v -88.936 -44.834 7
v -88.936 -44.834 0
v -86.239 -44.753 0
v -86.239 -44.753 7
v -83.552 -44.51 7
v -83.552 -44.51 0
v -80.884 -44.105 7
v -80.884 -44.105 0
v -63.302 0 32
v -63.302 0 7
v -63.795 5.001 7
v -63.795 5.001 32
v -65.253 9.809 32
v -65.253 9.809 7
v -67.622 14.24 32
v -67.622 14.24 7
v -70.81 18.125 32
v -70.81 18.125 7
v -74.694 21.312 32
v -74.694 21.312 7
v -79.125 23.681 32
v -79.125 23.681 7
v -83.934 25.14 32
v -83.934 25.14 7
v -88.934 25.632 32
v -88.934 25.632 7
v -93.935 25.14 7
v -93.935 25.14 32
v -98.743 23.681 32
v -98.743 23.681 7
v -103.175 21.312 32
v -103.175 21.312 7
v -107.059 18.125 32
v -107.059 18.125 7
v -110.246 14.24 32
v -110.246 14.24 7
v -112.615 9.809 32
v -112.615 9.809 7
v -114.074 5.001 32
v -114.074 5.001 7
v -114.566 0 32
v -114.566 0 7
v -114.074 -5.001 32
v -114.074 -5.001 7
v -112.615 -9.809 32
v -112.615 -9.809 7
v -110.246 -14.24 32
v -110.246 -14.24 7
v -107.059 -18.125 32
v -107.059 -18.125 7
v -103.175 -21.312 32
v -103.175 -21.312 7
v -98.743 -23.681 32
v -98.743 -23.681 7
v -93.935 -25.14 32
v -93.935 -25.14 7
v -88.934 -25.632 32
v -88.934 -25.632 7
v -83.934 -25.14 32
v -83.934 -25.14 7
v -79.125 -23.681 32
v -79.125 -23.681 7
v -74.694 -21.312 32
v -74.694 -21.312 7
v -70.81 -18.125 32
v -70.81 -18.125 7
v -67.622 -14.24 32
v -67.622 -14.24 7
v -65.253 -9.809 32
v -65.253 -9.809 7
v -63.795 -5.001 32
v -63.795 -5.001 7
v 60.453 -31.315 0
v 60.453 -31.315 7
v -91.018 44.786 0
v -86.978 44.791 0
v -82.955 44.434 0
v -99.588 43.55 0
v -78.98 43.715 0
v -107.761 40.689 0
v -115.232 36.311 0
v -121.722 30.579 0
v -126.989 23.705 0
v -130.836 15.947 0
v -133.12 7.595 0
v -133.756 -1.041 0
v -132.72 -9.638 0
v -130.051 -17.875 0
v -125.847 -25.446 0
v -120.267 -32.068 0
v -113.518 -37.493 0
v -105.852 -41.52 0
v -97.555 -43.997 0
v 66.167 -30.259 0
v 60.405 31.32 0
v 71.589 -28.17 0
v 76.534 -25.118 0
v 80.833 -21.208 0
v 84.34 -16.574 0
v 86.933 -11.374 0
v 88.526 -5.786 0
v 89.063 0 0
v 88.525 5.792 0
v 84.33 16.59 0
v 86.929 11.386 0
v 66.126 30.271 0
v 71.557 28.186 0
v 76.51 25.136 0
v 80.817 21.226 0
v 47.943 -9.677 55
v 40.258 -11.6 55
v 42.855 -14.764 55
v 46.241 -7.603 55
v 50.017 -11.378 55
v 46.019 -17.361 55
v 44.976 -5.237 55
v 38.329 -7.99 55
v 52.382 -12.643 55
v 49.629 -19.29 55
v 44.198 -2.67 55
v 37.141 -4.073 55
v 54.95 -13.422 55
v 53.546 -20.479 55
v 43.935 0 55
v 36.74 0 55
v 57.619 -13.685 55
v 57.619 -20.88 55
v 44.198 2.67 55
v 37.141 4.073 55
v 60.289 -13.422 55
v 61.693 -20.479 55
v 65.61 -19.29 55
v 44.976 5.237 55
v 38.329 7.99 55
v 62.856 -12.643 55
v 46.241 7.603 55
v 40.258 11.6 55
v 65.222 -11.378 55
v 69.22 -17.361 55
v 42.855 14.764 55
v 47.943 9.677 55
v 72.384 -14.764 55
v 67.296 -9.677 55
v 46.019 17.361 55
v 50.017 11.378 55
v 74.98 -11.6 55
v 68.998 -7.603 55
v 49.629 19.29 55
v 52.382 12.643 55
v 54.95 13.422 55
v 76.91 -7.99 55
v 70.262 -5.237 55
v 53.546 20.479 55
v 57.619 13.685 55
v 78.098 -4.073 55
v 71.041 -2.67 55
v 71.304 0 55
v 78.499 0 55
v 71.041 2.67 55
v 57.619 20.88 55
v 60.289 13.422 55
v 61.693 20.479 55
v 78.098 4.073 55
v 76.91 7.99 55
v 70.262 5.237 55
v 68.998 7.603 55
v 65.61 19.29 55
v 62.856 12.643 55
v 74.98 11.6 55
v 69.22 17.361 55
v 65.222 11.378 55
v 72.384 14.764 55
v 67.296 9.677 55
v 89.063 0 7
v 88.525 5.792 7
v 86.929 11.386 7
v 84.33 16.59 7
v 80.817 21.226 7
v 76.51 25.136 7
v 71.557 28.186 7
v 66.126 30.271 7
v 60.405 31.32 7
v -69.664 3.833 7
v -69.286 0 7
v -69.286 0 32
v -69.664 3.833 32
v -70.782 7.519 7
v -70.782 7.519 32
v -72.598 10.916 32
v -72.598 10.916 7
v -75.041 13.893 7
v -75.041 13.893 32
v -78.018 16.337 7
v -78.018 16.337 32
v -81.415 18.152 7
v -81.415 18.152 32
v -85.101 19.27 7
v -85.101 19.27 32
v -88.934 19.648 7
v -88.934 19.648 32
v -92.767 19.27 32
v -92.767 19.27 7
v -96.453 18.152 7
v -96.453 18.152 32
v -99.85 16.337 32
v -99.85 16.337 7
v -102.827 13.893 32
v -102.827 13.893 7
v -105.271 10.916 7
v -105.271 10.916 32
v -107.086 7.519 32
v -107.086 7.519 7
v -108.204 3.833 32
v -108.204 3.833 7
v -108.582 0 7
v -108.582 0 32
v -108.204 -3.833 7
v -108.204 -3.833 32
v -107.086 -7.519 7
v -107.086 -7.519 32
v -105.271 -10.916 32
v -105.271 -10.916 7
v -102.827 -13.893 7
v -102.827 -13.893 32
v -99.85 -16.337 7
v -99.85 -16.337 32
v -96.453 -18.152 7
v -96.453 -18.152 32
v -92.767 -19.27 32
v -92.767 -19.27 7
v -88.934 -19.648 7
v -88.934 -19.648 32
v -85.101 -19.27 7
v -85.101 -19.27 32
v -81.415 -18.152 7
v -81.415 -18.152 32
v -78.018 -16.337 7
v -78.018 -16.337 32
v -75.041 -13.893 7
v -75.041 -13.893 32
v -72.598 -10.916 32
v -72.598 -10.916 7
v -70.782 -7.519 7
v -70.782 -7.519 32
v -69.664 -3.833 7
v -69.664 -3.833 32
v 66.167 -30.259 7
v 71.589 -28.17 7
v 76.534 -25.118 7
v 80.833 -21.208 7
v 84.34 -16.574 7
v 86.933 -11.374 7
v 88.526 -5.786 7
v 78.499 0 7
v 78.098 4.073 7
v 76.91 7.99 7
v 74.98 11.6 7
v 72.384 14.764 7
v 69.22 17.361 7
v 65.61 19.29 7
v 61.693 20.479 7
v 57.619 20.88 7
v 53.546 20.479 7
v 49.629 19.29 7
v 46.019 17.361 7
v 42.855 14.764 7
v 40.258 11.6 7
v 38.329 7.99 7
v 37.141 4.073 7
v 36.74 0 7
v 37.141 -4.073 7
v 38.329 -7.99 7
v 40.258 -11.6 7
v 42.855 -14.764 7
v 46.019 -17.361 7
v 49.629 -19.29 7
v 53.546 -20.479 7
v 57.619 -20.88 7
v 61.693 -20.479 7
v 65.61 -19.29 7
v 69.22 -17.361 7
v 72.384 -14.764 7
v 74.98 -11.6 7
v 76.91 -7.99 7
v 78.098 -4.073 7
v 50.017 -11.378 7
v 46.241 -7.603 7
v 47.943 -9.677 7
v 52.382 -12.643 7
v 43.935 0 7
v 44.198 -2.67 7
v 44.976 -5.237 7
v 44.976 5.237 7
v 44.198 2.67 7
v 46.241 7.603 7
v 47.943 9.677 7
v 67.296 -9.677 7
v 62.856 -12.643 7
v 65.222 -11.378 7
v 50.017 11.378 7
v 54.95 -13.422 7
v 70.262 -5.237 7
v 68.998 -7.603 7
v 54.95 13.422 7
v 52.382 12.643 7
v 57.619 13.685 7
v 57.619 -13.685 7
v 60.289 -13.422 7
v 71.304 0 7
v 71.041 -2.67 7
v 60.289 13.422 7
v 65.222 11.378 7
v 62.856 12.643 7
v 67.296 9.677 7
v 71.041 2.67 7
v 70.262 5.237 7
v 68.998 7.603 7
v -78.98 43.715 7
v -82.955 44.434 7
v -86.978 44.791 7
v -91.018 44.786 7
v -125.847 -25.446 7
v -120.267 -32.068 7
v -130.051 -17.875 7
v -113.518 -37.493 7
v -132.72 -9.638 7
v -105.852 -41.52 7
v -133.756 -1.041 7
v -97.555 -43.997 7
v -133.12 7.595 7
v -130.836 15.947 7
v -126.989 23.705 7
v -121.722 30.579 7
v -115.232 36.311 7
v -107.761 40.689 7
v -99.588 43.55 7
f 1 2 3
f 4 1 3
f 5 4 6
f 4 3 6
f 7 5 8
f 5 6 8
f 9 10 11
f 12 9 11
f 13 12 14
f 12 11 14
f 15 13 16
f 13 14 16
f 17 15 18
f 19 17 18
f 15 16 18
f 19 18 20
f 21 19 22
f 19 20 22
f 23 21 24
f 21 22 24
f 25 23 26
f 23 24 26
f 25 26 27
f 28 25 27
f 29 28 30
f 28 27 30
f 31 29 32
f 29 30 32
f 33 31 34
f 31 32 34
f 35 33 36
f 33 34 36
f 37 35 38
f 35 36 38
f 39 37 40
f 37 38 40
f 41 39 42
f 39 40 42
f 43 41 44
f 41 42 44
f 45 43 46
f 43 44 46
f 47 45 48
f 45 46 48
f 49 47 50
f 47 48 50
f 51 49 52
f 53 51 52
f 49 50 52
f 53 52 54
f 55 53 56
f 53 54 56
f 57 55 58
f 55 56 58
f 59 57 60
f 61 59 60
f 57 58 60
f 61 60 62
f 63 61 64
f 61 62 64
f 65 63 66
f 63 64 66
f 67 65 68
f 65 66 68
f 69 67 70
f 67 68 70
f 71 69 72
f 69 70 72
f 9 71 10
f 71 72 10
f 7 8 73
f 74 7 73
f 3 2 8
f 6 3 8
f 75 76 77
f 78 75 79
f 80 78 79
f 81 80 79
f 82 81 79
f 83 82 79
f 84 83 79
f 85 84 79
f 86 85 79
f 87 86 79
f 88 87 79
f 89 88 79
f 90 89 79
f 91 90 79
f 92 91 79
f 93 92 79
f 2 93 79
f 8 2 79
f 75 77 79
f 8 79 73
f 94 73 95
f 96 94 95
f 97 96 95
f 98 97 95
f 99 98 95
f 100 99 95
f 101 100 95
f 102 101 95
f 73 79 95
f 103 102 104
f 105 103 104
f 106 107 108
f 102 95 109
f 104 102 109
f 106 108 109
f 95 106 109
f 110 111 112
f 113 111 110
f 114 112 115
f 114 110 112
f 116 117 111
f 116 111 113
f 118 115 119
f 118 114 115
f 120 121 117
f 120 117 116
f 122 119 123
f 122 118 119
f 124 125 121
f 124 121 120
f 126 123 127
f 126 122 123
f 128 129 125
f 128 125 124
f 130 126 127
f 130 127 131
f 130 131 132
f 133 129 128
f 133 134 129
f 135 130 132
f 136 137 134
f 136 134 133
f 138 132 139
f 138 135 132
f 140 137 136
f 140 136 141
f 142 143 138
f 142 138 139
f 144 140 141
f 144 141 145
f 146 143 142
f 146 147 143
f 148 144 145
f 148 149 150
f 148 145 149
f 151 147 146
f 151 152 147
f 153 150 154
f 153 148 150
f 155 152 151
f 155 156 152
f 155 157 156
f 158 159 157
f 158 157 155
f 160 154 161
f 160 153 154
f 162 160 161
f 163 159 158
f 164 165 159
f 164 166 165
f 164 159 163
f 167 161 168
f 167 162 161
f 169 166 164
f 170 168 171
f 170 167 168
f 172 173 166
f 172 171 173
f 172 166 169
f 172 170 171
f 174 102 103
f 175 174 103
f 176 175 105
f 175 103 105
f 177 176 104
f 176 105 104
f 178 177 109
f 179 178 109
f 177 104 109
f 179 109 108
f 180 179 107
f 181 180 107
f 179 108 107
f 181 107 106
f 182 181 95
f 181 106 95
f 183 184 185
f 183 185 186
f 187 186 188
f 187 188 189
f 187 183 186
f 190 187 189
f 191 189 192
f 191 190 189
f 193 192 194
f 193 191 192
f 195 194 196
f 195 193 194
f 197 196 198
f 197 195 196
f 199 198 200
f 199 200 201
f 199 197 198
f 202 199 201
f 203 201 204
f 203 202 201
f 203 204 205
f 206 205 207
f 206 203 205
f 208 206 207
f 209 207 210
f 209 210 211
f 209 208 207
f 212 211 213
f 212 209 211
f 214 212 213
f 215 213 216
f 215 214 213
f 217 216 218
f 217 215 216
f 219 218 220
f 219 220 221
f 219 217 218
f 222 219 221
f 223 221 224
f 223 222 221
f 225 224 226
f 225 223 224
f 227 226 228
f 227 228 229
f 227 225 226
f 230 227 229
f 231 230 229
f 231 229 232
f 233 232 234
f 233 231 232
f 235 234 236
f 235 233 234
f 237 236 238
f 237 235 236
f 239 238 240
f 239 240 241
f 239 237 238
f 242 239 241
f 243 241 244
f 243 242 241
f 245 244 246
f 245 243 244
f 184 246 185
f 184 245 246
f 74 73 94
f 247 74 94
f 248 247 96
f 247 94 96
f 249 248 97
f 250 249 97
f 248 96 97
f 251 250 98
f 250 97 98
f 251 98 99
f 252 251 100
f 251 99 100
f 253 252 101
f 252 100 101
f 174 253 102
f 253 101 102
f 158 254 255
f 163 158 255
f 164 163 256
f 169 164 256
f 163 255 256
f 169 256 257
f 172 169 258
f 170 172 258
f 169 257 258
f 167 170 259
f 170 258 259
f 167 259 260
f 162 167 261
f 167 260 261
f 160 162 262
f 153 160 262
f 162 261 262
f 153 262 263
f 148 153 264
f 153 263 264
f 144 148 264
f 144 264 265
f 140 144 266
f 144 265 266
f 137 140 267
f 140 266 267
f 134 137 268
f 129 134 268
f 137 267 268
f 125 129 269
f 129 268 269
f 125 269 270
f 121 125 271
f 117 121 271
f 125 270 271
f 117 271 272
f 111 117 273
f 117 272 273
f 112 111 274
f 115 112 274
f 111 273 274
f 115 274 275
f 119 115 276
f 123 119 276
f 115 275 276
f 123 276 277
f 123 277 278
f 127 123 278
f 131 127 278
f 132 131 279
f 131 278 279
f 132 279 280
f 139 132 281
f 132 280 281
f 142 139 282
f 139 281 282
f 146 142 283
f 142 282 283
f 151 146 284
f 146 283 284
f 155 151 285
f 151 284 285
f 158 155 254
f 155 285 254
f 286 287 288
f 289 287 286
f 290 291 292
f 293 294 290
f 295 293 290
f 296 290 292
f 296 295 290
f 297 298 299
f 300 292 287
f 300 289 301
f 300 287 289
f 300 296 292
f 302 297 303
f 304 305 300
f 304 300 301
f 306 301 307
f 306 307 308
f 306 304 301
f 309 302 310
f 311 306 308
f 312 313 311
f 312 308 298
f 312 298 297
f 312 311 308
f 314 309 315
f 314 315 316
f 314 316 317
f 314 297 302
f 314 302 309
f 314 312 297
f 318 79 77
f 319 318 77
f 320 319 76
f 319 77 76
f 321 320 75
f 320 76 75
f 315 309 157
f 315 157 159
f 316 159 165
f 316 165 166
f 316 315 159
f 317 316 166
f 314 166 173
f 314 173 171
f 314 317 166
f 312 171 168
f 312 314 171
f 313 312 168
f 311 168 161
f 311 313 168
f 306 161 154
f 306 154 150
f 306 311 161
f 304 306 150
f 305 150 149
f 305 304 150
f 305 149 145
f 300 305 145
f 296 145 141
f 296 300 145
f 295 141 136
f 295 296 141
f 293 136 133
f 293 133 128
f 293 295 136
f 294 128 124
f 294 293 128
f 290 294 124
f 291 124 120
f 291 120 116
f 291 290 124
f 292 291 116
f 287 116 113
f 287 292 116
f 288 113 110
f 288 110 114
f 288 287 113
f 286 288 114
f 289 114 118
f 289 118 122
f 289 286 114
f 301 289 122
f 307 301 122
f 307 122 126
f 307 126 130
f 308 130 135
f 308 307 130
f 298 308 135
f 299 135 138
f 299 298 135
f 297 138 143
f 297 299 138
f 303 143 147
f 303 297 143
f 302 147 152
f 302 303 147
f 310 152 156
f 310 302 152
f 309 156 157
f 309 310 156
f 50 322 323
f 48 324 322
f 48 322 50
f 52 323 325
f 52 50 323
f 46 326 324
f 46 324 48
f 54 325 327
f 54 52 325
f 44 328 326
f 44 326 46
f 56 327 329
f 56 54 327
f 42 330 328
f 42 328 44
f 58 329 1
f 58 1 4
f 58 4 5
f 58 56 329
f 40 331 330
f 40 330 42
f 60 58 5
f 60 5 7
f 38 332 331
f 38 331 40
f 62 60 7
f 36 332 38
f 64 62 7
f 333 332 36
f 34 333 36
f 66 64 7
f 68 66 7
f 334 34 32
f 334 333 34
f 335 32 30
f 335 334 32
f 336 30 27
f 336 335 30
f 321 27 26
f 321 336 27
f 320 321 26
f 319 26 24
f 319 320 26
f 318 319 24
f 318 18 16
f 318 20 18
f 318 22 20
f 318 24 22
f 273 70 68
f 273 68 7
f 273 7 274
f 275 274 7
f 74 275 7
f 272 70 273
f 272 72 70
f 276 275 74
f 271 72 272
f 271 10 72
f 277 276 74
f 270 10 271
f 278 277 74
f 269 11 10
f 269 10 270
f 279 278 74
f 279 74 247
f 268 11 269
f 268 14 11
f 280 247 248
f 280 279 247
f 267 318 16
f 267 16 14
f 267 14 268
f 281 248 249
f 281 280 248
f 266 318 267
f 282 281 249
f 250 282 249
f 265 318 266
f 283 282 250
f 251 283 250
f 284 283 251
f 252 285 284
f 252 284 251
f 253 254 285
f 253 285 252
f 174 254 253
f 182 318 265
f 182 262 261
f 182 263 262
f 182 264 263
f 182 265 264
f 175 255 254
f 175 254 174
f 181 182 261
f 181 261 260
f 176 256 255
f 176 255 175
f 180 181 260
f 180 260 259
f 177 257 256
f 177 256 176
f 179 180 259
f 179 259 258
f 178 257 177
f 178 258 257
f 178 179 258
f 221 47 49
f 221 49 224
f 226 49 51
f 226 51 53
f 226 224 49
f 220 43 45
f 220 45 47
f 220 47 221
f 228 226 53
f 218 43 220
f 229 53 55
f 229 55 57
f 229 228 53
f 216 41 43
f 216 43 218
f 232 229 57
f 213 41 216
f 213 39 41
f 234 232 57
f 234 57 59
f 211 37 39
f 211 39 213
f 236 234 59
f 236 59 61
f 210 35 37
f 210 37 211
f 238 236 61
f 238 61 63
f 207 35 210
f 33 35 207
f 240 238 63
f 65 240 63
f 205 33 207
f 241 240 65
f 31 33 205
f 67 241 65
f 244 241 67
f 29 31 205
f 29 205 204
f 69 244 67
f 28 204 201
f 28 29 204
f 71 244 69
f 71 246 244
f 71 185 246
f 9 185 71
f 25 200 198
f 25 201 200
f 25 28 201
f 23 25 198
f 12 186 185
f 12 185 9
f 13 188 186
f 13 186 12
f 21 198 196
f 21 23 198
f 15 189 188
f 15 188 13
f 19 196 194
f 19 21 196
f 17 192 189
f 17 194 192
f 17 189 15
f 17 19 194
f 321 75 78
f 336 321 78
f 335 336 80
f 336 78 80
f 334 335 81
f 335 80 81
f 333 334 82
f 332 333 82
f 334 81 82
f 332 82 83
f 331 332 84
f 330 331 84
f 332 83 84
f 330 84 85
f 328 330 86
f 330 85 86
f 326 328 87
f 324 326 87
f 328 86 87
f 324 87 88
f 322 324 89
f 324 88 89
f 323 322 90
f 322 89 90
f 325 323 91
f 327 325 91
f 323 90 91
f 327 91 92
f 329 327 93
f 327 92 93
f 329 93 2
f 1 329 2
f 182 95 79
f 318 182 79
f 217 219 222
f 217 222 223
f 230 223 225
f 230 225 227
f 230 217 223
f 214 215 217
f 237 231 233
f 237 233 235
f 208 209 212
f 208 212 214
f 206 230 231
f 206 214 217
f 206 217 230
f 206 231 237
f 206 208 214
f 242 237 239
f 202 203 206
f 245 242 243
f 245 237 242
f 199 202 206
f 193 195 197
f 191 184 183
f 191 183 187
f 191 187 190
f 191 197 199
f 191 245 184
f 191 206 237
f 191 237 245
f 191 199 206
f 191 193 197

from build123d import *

# Parameters (mm, degrees)
F1_DEPTH = 7
F2_R     = 20.8798
F2_R_2   = 13.684699
F3_DEPTH = 48
F4_R     = 25.632052
F4_R_2   = 19.647778
F5_DEPTH = 25


with BuildPart() as f1:
    # F0 (on Top) → F1 (new body)
    with BuildSketch(Plane.XY):
        with BuildLine():
            Line((-78.980386, 43.715201), (-91.017656, 44.785673))
            ThreePointArc((-91.017656, 44.785673), (-133.756226, -1.040908), (-88.936403, -44.834108))
            Line((-88.936403, -44.834108), (-80.883583, -44.105383))
            ThreePointArc((-80.883583, -44.105383), (-54.502824, -28.715457), (-44.100093, 0))
            ThreePointArc((-44.100093, 0), (-53.888748, 27.962715), (-78.980386, 43.715201))
        make_face()
        with BuildLine():
            ThreePointArc((-78.980386, 43.715201), (-84.962788, 44.657868), (-91.017656, 44.785673))
            Line((-91.017656, 44.785673), (-78.980386, 43.715201))
        make_face()
        with BuildLine():
            Line((-80.883583, -44.105383), (-88.936403, -44.834108))
            ThreePointArc((-88.936403, -44.834108), (-84.893531, -44.651655), (-80.883583, -44.105383))
        make_face()
        with BuildLine():
            Line((60.404596, 31.319727), (-78.980386, 43.715201))
            ThreePointArc((-78.980386, 43.715201), (-53.888748, 27.962715), (-44.100093, 0))
            ThreePointArc((-44.100093, 0), (-54.502824, -28.715457), (-80.883583, -44.105383))
            Line((-80.883583, -44.105383), (60.453168, -31.31537))
            ThreePointArc((60.453168, -31.31537), (26.17602, -0.024383), (60.404596, 31.319727))
        make_face()
        with BuildLine():
            ThreePointArc((89.06267, 0), (80.816977, 21.226225), (60.404596, 31.319727))
            ThreePointArc((60.404596, 31.319727), (26.17602, -0.024383), (60.453168, -31.31537))
            ThreePointArc((60.453168, -31.31537), (80.83343, -21.20823), (89.06267, 0))
        make_face()
    extrude(amount=F1_DEPTH)

    # F2 (on face) → F3 (join)
    with BuildSketch(Plane.XY.offset(7)):
        with Locations((57.61934, 0)):
            Circle(F2_R)
        with Locations((57.61934, 0)):
            Circle(F2_R_2, mode=Mode.SUBTRACT)
    extrude(amount=F3_DEPTH)

    # F4 (on face) → F5 (join)
    with BuildSketch(Plane.XY.offset(7)):
        with Locations((-88.934202, 0)):
            Circle(F4_R)
        with Locations((-88.934202, 0)):
            Circle(F4_R_2, mode=Mode.SUBTRACT)
    extrude(amount=F5_DEPTH)


solid = f1.part
